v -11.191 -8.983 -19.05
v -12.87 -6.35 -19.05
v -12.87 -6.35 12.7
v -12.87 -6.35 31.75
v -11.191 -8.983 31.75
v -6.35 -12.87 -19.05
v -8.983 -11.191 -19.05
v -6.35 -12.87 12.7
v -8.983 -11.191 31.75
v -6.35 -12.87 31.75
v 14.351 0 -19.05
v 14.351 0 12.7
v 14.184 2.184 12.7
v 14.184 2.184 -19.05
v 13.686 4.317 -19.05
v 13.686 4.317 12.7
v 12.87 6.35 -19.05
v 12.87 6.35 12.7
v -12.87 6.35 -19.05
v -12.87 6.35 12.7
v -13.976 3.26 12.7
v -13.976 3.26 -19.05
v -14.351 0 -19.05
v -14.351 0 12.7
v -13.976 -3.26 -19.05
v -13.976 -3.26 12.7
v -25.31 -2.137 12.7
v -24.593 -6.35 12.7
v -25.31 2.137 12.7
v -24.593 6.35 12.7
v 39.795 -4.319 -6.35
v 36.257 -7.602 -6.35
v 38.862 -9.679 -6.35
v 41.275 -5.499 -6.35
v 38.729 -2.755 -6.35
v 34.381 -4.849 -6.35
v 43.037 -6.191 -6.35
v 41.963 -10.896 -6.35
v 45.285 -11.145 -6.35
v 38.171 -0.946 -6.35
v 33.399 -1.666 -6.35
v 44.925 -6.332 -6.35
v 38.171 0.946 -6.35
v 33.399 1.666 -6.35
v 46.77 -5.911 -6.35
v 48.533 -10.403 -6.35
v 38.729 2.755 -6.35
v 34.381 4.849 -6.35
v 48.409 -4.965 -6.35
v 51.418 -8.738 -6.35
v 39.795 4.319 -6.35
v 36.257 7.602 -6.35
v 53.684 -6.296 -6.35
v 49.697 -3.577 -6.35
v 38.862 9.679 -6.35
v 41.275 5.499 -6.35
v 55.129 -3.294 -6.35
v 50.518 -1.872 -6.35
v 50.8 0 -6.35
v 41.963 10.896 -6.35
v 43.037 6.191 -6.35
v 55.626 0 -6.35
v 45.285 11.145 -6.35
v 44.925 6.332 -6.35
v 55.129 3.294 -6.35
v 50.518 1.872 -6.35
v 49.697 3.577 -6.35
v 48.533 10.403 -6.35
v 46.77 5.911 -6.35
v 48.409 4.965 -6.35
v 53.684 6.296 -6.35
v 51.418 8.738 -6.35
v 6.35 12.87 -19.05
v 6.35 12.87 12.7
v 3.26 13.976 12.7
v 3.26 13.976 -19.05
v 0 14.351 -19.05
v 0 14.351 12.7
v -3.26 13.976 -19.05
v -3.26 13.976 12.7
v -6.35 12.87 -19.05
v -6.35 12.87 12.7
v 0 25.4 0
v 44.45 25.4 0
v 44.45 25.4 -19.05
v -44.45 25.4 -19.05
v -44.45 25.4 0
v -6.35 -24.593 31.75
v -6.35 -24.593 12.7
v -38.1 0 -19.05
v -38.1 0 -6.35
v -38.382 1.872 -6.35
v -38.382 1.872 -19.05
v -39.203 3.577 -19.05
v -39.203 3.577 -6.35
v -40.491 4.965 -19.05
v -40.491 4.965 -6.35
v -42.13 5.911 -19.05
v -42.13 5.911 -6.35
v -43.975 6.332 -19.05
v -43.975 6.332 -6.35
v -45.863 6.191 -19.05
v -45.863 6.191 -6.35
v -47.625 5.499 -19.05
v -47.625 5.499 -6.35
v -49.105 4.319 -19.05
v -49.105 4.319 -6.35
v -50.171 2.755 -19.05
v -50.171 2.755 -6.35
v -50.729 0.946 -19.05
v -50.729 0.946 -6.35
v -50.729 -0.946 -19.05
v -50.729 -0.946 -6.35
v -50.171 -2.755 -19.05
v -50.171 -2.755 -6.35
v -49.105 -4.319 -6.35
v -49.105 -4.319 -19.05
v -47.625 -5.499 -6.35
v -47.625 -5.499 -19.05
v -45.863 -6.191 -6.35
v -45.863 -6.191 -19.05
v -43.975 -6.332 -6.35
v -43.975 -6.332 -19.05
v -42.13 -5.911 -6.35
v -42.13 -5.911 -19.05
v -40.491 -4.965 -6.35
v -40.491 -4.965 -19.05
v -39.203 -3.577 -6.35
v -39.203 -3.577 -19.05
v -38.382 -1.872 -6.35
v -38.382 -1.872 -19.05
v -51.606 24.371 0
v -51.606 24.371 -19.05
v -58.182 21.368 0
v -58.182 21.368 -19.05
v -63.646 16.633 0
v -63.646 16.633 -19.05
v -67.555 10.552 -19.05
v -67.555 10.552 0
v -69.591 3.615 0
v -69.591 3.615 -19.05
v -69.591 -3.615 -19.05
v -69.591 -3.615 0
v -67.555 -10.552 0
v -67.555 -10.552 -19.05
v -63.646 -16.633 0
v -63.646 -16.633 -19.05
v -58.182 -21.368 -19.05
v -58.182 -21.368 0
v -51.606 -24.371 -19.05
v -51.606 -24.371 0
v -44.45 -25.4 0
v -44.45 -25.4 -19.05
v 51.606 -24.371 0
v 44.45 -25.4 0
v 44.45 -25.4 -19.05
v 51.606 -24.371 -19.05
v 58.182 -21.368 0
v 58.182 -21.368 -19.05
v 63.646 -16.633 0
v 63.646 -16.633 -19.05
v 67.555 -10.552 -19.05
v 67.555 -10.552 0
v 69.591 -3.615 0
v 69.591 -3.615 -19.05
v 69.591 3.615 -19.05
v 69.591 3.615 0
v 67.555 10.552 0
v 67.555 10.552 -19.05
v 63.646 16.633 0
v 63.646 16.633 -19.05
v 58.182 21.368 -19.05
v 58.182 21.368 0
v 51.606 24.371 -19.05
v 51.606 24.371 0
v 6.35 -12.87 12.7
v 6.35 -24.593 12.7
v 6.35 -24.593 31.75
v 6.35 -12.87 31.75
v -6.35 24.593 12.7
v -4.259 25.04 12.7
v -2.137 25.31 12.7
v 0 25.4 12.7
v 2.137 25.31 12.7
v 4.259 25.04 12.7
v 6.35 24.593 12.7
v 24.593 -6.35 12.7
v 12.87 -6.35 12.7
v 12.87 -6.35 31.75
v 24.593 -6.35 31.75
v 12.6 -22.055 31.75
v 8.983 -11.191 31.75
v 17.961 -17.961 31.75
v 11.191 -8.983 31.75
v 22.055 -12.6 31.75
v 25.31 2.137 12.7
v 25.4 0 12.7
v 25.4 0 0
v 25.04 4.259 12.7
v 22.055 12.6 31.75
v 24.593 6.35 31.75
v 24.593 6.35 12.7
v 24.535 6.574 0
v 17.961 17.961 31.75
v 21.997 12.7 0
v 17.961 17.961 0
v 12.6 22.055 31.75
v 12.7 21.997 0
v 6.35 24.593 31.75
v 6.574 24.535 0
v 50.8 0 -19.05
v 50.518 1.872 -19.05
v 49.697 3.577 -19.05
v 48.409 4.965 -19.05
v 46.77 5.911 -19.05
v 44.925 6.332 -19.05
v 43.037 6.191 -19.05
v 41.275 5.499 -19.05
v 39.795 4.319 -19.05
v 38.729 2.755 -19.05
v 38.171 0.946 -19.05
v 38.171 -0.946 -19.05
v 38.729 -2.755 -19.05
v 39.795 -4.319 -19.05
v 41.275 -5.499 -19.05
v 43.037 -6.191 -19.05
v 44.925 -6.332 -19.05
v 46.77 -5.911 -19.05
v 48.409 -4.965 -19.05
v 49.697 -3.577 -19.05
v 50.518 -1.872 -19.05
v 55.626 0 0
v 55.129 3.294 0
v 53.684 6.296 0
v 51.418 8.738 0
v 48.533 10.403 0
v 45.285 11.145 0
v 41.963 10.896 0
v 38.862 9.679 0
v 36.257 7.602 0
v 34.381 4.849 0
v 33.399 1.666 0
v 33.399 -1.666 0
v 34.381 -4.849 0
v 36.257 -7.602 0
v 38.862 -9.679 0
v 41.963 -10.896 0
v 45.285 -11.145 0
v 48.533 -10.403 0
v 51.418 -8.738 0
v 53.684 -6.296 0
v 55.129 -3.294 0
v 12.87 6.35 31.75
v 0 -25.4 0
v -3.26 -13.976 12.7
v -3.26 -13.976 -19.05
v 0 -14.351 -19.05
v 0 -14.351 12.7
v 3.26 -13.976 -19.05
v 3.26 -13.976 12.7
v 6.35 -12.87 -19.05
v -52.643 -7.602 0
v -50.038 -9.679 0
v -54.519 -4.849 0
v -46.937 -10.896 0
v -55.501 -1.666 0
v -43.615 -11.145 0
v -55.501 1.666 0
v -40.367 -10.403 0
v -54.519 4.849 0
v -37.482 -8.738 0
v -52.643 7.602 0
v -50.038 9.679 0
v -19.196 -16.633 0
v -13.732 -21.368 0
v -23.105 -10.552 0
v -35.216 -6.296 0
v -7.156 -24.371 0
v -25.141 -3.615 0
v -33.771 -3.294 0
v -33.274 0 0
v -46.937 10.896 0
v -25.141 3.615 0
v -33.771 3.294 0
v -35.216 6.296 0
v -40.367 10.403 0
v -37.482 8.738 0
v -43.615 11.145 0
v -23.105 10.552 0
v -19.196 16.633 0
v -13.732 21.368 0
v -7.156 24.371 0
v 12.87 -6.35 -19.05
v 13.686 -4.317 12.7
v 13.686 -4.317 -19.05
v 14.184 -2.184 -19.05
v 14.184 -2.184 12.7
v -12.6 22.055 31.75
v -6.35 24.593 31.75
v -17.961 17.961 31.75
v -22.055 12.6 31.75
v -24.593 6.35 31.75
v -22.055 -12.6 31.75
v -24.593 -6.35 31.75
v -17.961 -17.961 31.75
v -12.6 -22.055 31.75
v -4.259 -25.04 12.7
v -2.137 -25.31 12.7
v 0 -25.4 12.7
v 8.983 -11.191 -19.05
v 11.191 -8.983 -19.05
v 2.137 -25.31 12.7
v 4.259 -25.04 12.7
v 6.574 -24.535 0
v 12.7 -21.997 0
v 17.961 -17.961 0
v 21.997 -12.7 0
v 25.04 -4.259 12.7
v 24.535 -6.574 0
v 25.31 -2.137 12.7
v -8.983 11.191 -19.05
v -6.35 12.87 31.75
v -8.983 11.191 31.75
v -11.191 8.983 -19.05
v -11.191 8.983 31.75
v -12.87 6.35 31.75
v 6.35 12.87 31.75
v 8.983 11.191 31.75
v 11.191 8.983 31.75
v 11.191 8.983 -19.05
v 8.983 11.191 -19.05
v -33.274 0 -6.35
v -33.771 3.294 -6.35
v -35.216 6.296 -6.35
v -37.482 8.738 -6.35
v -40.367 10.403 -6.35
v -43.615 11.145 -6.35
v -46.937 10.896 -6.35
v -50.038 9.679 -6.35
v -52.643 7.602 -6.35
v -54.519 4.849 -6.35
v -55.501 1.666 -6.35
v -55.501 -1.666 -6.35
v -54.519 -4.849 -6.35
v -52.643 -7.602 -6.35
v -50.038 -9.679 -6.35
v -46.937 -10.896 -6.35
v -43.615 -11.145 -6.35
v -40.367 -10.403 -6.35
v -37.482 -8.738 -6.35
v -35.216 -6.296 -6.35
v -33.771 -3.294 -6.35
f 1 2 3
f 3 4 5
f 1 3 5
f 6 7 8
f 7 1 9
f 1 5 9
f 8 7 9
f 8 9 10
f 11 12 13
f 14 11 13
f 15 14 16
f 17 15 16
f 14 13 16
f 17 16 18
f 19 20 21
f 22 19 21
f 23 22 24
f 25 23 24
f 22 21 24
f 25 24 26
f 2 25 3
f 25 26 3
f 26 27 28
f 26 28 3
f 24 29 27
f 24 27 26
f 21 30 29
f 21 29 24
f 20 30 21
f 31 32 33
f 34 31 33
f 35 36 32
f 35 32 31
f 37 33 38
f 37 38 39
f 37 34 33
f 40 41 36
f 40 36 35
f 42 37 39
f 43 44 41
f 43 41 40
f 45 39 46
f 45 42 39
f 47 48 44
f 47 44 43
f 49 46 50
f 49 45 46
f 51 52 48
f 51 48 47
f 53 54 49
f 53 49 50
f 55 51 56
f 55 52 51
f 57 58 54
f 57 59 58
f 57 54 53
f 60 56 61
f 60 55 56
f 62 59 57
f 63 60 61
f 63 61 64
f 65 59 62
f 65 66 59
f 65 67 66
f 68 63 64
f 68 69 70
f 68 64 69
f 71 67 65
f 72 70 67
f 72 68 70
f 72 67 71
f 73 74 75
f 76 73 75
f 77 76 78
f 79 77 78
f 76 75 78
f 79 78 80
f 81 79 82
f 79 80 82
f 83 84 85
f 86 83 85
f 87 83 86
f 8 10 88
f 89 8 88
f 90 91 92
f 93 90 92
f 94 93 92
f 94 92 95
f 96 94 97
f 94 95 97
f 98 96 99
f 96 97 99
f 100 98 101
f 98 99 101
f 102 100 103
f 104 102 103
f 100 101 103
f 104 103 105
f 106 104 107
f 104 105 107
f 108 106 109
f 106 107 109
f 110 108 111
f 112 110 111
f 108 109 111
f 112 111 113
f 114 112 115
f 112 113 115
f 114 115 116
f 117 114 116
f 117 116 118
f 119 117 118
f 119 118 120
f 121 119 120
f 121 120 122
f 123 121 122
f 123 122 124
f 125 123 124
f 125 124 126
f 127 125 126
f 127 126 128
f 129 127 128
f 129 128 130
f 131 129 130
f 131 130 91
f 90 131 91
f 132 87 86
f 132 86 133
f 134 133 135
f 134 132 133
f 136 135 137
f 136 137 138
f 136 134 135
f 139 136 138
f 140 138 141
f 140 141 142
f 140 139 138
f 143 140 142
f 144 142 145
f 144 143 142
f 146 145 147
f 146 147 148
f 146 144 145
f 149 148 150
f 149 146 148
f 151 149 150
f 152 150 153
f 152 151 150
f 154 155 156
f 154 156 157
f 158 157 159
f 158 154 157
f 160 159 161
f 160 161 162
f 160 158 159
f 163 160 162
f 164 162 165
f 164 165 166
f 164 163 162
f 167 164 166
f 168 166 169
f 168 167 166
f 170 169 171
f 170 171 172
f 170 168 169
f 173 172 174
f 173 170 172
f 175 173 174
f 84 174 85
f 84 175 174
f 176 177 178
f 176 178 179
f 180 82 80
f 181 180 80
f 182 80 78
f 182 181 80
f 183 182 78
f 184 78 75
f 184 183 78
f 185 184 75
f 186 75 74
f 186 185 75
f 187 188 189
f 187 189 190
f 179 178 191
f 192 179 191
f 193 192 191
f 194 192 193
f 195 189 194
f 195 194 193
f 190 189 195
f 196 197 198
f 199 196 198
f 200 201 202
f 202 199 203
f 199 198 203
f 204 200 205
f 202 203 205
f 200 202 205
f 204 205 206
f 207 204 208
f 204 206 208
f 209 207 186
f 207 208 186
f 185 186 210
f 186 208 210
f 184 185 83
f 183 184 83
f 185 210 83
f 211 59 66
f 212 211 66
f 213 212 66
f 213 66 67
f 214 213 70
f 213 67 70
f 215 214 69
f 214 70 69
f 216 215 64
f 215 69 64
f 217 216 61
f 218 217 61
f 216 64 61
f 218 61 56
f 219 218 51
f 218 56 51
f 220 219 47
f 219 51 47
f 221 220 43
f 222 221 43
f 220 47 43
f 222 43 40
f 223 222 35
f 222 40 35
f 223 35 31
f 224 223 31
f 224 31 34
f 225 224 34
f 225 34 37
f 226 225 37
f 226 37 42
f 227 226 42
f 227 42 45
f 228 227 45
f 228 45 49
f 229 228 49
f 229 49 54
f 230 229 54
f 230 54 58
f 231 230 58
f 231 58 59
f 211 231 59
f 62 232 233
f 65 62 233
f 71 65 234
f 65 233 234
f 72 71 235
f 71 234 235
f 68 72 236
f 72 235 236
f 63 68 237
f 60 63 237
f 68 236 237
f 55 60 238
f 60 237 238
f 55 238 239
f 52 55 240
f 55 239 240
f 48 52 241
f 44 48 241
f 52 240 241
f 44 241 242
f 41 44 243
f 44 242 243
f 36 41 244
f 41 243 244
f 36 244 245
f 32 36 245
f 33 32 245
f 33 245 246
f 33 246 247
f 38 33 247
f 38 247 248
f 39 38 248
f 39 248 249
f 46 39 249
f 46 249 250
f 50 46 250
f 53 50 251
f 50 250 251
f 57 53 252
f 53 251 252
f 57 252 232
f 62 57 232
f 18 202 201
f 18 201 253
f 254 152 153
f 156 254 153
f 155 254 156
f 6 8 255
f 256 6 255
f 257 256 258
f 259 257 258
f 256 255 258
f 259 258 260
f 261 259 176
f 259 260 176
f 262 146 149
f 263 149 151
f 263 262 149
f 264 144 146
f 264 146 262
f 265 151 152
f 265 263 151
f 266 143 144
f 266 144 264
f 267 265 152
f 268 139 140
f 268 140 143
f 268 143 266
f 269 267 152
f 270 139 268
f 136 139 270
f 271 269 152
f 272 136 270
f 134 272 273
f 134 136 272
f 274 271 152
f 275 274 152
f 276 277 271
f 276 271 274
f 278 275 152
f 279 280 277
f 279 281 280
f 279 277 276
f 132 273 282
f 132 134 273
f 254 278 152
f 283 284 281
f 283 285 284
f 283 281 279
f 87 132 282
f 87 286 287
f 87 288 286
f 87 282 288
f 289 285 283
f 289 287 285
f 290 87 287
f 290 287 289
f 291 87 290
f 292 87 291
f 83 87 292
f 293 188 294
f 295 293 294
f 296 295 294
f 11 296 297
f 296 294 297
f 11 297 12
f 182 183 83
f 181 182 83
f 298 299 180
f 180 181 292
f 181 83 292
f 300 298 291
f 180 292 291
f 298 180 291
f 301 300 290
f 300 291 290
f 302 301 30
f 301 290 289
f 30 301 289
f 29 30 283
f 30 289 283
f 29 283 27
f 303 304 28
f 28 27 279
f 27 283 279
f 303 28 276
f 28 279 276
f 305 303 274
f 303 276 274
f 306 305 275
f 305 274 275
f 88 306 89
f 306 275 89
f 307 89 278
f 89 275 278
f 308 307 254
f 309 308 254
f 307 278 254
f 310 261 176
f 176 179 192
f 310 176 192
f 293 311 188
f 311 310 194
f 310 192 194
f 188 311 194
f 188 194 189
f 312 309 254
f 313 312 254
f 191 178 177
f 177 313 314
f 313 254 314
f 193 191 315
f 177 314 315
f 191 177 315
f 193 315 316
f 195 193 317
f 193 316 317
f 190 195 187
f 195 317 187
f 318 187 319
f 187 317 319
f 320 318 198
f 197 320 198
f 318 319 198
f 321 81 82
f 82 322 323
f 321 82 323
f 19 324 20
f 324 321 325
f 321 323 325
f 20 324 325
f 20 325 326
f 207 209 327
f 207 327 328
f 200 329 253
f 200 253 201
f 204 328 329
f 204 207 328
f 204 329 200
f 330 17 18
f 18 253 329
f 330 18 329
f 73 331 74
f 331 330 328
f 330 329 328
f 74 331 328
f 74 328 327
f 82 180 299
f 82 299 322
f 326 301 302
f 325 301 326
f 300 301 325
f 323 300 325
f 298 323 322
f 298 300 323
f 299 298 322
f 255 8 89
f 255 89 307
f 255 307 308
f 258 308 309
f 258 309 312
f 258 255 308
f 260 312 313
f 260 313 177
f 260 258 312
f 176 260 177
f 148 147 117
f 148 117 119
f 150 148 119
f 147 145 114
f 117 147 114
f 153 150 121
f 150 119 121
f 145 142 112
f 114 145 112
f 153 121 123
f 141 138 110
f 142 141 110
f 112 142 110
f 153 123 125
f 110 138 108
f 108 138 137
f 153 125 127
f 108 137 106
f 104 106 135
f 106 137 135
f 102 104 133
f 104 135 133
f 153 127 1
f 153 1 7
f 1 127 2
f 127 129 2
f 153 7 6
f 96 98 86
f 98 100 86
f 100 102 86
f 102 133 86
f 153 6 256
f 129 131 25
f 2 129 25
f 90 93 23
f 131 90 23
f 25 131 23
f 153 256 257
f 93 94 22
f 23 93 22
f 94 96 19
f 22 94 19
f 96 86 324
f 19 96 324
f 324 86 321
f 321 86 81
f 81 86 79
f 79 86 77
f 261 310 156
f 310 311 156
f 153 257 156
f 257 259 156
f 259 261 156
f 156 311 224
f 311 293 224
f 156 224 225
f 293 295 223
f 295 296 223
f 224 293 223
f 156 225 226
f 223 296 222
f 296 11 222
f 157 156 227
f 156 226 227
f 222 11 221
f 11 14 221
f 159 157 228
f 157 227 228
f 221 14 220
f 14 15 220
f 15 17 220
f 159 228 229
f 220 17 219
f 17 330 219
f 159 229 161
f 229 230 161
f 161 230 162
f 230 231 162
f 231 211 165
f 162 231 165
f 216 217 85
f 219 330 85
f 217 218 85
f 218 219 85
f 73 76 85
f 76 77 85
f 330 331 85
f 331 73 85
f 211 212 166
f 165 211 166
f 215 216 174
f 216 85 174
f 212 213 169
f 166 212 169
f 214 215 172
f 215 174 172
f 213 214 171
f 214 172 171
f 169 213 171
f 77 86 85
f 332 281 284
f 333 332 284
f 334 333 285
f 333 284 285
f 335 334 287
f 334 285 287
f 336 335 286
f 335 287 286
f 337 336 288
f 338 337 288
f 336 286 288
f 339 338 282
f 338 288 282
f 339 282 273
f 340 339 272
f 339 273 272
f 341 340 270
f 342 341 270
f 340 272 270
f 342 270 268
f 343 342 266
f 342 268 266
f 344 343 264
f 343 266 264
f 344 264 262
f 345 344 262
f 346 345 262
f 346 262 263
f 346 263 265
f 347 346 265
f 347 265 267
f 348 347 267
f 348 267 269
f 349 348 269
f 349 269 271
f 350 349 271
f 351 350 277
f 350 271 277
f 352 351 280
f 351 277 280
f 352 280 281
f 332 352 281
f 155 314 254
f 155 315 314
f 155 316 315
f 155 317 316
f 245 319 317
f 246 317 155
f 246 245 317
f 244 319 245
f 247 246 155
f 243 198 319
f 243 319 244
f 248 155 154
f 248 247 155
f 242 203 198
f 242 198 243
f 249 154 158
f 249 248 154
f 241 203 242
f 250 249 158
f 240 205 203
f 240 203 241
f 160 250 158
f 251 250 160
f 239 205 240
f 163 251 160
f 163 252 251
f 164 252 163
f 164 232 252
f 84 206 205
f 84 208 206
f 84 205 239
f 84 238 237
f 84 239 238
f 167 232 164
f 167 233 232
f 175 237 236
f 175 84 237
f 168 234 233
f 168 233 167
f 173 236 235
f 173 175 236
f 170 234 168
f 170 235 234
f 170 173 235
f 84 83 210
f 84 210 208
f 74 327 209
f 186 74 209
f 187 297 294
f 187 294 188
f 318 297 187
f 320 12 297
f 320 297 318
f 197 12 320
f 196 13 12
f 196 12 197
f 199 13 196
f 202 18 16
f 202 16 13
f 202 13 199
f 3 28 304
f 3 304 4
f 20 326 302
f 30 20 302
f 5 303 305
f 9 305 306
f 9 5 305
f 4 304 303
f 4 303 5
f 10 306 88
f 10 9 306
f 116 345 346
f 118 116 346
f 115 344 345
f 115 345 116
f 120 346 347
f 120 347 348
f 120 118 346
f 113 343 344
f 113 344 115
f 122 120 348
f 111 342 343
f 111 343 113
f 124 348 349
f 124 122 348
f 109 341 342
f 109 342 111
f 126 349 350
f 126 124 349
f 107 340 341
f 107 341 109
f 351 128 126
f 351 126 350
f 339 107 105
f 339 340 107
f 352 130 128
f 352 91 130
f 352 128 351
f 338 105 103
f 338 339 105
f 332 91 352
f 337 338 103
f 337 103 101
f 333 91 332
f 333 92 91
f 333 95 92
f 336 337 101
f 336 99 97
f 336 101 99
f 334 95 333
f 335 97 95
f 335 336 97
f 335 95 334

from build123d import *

# Parameters (mm, degrees)
F0_R     = 11.176
F0_R_2   = 6.35
F1_DEPTH = 19.05
F2_DEPTH = 6.35
F3_DEPTH = 31.75
F5_DEPTH = 19.05
F6_DEPTH = 50.8


with BuildPart() as f1:
    # F0 (on Top) → F1 (new body)
    with BuildSketch(Plane.XY):
        with BuildLine():
            ThreePointArc((-44.45, 25.4), (-69.85, 0), (-44.45, -25.4))
            Line((-44.45, -25.4), (2.63e-08, -25.4))
            ThreePointArc((2.63e-08, -25.4), (-25.4, -1.24e-08), (1.5e-09, 25.4))
            Line((1.5e-09, 25.4), (-44.45, 25.4))
        make_face()
        with Locations((-44.45, 0)):
            Circle(F0_R, mode=Mode.SUBTRACT)
        with BuildLine():
            ThreePointArc((25.4, 0), (17.9605122514, -17.9605122328), (2.63e-08, -25.4))
            Line((2.63e-08, -25.4), (44.45, -25.4))
            ThreePointArc((44.45, -25.4), (69.85, 0), (44.45, 25.4))
            Line((44.45, 25.4), (1.5e-09, 25.4))
            ThreePointArc((1.5e-09, 25.4), (17.9605122427, 17.9605122416), (25.4, 0))
        make_face()
        with Locations((44.45, 0)):
            Circle(F0_R, mode=Mode.SUBTRACT)
        with Locations((-44.45, 0)):
            Circle(F0_R)
        with Locations((-44.45, 0)):
            Circle(F0_R_2, mode=Mode.SUBTRACT)
        with Locations((44.45, 0)):
            Circle(F0_R)
        with Locations((44.45, 0)):
            Circle(F0_R_2, mode=Mode.SUBTRACT)
        with BuildLine():
            ThreePointArc((1.5e-09, 25.4), (-25.4, -1.24e-08), (2.63e-08, -25.4))
            ThreePointArc((2.63e-08, -25.4), (17.9605122514, -17.9605122328), (25.4, 0))
            ThreePointArc((25.4, 0), (17.9605122427, 17.9605122416), (1.5e-09, 25.4))
        make_face()
    extrude(amount=-F1_DEPTH)

    # F0 (on Top) → F2 (cut)
    with BuildSketch(Plane.XY):
        with Locations((-44.45, 0)):
            Circle(F0_R)
        with Locations((-44.45, 0)):
            Circle(F0_R_2, mode=Mode.SUBTRACT)
        with Locations((44.45, 0)):
            Circle(F0_R)
        with Locations((44.45, 0)):
            Circle(F0_R_2, mode=Mode.SUBTRACT)
    extrude(amount=-F2_DEPTH, mode=Mode.SUBTRACT)

    # F0 (on Top) → F3 (join)
    with BuildSketch(Plane.XY):
        with BuildLine():
            ThreePointArc((1.5e-09, 25.4), (-25.4, -1.24e-08), (2.63e-08, -25.4))
            ThreePointArc((2.63e-08, -25.4), (17.9605122514, -17.9605122328), (25.4, 0))
            ThreePointArc((25.4, 0), (17.9605122427, 17.9605122416), (1.5e-09, 25.4))
        make_face()
    extrude(amount=F3_DEPTH)

    # F4 (on face) → F5 (cut)
    with BuildSketch(Plane.XY.offset(31.75)):
        with BuildLine():
            Line((6.35, -24.5934442484), (6.35, -12.8696814646))
            ThreePointArc((6.35, -12.8696814646), (0, -14.351), (-6.35, -12.8696814646))
            Line((-6.35, -12.8696814646), (-6.35, -24.5934442484))
            ThreePointArc((-6.35, -24.5934442484), (0, -25.4), (6.35, -24.5934442484))
        make_face()
        with BuildLine():
            ThreePointArc((-12.8696814646, -6.35), (-14.351, 0), (-12.8696814646, 6.35))
            Line((-12.8696814646, 6.35), (-24.5934442484, 6.35))
            ThreePointArc((-24.5934442484, 6.35), (-25.4, 0), (-24.5934442484, -6.35))
            Line((-24.5934442484, -6.35), (-12.8696814646, -6.35))
        make_face()
        with BuildLine():
            ThreePointArc((-6.35, 12.8696814646), (0, 14.351), (6.35, 12.8696814646))
            Line((6.35, 12.8696814646), (6.35, 24.5934442484))
            ThreePointArc((6.35, 24.5934442484), (0, 25.4), (-6.35, 24.5934442484))
            Line((-6.35, 24.5934442484), (-6.35, 12.8696814646))
        make_face()
        with BuildLine():
            ThreePointArc((12.8696814646, 6.35), (13.9757647322, 3.260245566), (14.351, 0))
            ThreePointArc((14.351, 0), (13.9757647322, -3.260245566), (12.8696814646, -6.35))
            Line((12.8696814646, -6.35), (24.5934442484, -6.35))
            ThreePointArc((24.5934442484, -6.35), (25.1975542852, -3.2005090291), (25.4, 0))
            ThreePointArc((25.4, 0), (25.1975542852, 3.2005090291), (24.5934442484, 6.35))
            Line((24.5934442484, 6.35), (12.8696814646, 6.35))
        make_face()
    extrude(amount=-F5_DEPTH, mode=Mode.SUBTRACT)

    # F4 (on face) → F6 (cut, through all)
    with BuildSketch(Plane.XY.offset(31.75)):
        with BuildLine():
            ThreePointArc((12.8696814646, -6.35), (13.9757647322, -3.260245566), (14.351, 0))
            ThreePointArc((14.351, 0), (13.9757647322, 3.260245566), (12.8696814646, 6.35))
            ThreePointArc((12.8696814646, 6.35), (10.1476894168, 10.1476894168), (6.35, 12.8696814646))
            ThreePointArc((6.35, 12.8696814646), (0, 14.351), (-6.35, 12.8696814646))
            ThreePointArc((-6.35, 12.8696814646), (-10.1476894168, 10.1476894168), (-12.8696814646, 6.35))
            ThreePointArc((-12.8696814646, 6.35), (-14.351, 0), (-12.8696814646, -6.35))
            ThreePointArc((-12.8696814646, -6.35), (-10.1476894168, -10.1476894168), (-6.35, -12.8696814646))
            ThreePointArc((-6.35, -12.8696814646), (0, -14.351), (6.35, -12.8696814646))
            ThreePointArc((6.35, -12.8696814646), (10.1476894168, -10.1476894168), (12.8696814646, -6.35))
        make_face()
    extrude(amount=-F6_DEPTH, mode=Mode.SUBTRACT)


solid = f1.part
